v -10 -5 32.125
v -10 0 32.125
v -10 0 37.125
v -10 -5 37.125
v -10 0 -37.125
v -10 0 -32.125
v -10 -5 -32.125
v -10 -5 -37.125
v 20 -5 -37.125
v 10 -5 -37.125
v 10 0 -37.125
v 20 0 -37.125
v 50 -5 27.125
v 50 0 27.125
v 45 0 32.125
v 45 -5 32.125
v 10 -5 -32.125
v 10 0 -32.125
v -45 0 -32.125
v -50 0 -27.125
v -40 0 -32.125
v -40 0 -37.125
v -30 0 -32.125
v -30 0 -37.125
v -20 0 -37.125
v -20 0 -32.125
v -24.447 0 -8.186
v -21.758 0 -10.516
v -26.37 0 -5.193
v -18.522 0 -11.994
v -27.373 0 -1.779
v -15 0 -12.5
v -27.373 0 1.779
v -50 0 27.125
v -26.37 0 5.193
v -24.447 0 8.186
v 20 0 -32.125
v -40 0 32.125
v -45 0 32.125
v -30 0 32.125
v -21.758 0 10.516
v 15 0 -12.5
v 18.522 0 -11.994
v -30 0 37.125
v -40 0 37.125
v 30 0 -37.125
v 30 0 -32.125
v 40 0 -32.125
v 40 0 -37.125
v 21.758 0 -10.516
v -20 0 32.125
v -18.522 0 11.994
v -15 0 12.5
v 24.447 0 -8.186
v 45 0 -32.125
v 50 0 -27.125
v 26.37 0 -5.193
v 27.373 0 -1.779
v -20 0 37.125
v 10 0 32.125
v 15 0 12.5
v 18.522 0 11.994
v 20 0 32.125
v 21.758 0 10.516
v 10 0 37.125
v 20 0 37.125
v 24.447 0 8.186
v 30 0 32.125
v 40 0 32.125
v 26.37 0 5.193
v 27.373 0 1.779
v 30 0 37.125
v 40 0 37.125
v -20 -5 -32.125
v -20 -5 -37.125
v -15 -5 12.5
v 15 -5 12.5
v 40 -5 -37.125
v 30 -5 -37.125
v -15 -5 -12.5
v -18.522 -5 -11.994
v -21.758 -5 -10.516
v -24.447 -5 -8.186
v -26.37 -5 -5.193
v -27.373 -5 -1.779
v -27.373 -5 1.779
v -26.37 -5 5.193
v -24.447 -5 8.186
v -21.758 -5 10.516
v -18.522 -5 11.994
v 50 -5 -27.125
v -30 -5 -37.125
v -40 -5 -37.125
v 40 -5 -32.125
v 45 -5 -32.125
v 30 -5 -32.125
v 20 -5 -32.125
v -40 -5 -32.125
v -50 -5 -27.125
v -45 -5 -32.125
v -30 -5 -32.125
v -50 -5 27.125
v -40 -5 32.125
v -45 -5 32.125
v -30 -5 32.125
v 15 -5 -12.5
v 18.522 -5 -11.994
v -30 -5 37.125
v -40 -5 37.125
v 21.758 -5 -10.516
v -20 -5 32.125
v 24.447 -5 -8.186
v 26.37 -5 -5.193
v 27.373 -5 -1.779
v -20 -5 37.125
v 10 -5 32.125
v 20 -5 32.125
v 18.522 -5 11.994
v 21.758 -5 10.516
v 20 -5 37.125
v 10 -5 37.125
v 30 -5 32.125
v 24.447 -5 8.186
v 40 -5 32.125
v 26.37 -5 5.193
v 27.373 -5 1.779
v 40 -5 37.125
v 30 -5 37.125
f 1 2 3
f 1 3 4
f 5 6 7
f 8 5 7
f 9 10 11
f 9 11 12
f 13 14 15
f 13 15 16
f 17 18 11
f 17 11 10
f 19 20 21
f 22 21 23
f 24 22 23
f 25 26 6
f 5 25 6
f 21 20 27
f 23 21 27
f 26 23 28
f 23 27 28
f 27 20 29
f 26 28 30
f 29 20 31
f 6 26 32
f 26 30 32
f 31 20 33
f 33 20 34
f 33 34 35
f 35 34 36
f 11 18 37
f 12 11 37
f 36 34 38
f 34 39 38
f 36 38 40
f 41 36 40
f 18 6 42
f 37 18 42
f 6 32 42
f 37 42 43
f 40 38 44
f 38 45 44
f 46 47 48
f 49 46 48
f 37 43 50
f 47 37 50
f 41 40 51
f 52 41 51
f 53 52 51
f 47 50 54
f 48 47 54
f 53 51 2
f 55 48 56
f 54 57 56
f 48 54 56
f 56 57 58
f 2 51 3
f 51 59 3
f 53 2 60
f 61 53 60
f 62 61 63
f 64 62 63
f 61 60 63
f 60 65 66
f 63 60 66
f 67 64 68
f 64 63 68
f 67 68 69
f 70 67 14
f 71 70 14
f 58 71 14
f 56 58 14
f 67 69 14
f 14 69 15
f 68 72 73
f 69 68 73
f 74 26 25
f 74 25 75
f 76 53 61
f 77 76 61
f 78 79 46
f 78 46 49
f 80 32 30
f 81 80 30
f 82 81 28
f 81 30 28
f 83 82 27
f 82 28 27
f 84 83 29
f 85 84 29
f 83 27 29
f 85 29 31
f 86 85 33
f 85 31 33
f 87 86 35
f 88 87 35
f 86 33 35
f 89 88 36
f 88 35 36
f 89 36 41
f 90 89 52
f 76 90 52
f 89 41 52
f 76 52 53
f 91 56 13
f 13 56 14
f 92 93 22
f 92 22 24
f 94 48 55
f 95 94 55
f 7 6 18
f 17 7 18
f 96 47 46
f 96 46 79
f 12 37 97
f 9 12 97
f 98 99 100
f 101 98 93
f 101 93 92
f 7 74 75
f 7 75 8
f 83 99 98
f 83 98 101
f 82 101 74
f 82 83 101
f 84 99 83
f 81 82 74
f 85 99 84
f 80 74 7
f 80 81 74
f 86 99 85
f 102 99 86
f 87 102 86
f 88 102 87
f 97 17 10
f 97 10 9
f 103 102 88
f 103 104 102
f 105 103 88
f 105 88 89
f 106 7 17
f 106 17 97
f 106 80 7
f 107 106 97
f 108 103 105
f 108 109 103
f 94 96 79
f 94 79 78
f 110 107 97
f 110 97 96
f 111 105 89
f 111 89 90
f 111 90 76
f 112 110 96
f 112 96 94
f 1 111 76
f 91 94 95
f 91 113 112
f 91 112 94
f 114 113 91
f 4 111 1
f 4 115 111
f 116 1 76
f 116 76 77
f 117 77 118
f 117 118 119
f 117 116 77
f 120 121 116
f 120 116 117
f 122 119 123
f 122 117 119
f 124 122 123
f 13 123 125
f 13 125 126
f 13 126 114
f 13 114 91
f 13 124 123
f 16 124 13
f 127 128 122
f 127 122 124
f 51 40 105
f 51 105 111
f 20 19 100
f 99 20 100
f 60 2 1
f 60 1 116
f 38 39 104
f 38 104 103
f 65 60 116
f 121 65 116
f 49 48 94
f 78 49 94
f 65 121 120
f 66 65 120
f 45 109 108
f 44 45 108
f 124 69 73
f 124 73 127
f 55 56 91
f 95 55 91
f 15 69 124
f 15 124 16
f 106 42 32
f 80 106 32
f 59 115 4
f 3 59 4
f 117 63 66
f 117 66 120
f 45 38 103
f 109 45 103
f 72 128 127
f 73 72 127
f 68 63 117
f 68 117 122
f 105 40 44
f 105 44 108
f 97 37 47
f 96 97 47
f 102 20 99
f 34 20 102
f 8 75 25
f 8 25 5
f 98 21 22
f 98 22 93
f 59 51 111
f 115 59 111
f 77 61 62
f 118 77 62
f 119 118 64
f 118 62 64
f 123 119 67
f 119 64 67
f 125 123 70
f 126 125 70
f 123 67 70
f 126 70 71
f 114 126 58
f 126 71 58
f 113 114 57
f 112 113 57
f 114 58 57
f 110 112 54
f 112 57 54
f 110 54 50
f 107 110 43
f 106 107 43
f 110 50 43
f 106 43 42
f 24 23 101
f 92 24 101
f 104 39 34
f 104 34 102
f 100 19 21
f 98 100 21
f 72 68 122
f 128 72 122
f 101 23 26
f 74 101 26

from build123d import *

# Parameters (mm, degrees)
F0_W     = 100
F0_H     = 64.25
F1_DEPTH = 5
F2_SIZE  = 5
F3_W     = 10
F3_H     = 5
F4_DEPTH = 5


# Not quite as in the source:
# - a pattern or mirror of a feature is missing from the dataset's text; its kind, count and spacing are read off the source's solid


with BuildPart() as f1:
    # F0 (on Front) → F1 (new body)
    with BuildSketch(Plane.XZ):
        Rectangle(F0_W, F0_H)
        with BuildLine():
            Line((15, -12.5), (-15, -12.5))
            ThreePointArc((-15, -12.5), (-27.5, 0), (-15, 12.5))
            Line((-15, 12.5), (15, 12.5))
            ThreePointArc((15, 12.5), (27.5, 0), (15, -12.5))
        make_face(mode=Mode.SUBTRACT)
    extrude(amount=F1_DEPTH)

    # F2
    f2_edges = [f1.edges().sort_by_distance(p)[0] for p in [
        (-50, -2.5, 32.125),
        (50, -2.5, 32.125),
        (-50, -2.5, -32.125),
        (50, -2.5, -32.125),
    ]]
    chamfer(f2_edges, length=F2_SIZE)

    # F3 (on face) → F4 (join)
    with BuildSketch(Plane(origin=(0, 0, -32.125), x_dir=(1, 0, 0), z_dir=(0, 0, -1))):
        with Locations((35, 2.5)):
            Rectangle(F3_W, F3_H)
        with Locations((15, 2.5)):
            Rectangle(F3_W, F3_H)
        with Locations((-15, 2.5)):
            Rectangle(F3_W, F3_H)
        with Locations((-35, 2.5)):
            Rectangle(F3_W, F3_H)
    f4 = extrude(amount=F4_DEPTH)

    # F4_copies: F4 across plane
    add(f4.mirror(Plane.XY))


solid = f1.part
